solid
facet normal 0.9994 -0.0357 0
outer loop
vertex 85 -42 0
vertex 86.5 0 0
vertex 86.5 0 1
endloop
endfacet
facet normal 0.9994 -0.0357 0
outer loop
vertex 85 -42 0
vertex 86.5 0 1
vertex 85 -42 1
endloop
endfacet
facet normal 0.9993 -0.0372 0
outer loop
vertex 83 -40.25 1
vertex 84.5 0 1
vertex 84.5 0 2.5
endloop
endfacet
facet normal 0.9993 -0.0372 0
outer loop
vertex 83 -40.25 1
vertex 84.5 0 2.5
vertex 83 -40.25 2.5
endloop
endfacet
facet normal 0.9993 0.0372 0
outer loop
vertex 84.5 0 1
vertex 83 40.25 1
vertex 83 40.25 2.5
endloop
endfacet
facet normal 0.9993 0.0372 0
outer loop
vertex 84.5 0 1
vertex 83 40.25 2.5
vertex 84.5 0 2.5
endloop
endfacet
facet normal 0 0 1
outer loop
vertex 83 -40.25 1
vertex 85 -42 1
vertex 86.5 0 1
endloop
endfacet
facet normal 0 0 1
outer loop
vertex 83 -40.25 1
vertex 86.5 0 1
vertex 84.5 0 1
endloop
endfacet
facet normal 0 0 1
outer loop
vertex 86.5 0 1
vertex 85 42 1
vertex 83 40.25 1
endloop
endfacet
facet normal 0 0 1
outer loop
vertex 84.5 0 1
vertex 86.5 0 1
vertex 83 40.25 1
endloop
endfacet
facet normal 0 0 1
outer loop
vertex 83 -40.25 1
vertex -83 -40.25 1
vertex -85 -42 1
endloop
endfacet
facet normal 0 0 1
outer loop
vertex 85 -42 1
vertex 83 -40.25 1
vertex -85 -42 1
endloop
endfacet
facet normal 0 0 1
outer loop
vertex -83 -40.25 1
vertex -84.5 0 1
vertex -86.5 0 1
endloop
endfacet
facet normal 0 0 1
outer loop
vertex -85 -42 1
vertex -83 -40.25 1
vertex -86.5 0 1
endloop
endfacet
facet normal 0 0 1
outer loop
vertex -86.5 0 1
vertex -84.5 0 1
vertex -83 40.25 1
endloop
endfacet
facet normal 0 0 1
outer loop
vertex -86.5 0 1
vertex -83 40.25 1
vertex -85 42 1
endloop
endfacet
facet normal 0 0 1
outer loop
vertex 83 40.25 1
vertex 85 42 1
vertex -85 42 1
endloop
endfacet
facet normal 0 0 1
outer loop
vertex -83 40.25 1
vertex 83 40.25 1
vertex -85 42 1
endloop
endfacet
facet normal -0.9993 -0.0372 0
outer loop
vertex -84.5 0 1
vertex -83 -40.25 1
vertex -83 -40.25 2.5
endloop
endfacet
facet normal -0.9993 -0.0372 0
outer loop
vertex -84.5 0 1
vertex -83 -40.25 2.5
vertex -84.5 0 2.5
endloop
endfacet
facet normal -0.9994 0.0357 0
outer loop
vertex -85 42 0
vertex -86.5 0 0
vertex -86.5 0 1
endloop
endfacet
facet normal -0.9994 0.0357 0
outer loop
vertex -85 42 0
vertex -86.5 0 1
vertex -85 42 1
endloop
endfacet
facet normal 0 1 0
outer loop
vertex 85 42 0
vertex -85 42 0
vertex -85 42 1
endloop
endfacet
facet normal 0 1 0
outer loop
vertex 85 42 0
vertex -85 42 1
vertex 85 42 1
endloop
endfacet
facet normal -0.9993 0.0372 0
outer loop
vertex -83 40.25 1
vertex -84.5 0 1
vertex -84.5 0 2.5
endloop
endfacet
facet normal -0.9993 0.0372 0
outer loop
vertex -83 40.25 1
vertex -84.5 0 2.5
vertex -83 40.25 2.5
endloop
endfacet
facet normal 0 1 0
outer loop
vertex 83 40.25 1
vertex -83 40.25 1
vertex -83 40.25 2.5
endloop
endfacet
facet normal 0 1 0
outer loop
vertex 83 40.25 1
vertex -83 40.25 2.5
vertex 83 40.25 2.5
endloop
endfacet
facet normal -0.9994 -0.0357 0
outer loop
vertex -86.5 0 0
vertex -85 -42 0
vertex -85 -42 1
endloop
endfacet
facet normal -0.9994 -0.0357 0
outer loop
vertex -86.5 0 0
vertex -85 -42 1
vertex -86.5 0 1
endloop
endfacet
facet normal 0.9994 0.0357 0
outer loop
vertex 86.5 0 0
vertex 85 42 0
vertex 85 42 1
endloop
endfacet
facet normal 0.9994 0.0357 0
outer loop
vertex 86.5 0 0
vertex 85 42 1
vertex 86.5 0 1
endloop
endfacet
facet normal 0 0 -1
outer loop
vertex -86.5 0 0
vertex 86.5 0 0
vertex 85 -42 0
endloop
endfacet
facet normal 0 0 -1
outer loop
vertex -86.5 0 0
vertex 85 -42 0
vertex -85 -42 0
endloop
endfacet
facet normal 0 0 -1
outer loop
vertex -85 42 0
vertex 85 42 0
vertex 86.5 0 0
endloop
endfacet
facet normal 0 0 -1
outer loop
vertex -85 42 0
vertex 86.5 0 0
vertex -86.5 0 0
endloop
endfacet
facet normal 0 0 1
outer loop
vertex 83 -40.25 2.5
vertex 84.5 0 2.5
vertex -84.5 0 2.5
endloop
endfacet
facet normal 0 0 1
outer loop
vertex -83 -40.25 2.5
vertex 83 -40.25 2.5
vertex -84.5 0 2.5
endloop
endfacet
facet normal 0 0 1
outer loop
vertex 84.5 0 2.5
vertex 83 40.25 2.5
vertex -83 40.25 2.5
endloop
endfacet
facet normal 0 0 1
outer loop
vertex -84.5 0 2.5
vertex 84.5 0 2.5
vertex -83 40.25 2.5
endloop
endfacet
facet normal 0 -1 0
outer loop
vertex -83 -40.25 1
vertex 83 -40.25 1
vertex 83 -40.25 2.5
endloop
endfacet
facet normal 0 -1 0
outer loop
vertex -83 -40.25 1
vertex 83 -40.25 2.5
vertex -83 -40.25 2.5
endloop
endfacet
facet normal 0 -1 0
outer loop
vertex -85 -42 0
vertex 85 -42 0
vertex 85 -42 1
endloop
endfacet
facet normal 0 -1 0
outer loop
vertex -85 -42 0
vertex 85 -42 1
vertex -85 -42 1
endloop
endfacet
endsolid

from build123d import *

# Parameters (mm, degrees)
BOSS_EXTRUDE1_DEPTH = 1
BOSS_EXTRUDE2_DEPTH = 1.5


with BuildPart() as part:
    # Sketch1 → Boss-Extrude1 (new body)
    with BuildSketch(Plane.XY):
        Polygon((-85, 42), (85, 42), (86.5, 0), (85, -42), (-85, -42), (-86.5, 0), align=None)
    extrude(amount=BOSS_EXTRUDE1_DEPTH)

    # Sketch2 → Boss-Extrude2 (add)
    with BuildSketch(Plane.XY.offset(1)):
        Polygon((-83, 40.25), (83, 40.25), (84.5, 0), (83, -40.25), (-83, -40.25), (-84.5, 0), align=None)
    extrude(amount=BOSS_EXTRUDE2_DEPTH)


solid = part.part
